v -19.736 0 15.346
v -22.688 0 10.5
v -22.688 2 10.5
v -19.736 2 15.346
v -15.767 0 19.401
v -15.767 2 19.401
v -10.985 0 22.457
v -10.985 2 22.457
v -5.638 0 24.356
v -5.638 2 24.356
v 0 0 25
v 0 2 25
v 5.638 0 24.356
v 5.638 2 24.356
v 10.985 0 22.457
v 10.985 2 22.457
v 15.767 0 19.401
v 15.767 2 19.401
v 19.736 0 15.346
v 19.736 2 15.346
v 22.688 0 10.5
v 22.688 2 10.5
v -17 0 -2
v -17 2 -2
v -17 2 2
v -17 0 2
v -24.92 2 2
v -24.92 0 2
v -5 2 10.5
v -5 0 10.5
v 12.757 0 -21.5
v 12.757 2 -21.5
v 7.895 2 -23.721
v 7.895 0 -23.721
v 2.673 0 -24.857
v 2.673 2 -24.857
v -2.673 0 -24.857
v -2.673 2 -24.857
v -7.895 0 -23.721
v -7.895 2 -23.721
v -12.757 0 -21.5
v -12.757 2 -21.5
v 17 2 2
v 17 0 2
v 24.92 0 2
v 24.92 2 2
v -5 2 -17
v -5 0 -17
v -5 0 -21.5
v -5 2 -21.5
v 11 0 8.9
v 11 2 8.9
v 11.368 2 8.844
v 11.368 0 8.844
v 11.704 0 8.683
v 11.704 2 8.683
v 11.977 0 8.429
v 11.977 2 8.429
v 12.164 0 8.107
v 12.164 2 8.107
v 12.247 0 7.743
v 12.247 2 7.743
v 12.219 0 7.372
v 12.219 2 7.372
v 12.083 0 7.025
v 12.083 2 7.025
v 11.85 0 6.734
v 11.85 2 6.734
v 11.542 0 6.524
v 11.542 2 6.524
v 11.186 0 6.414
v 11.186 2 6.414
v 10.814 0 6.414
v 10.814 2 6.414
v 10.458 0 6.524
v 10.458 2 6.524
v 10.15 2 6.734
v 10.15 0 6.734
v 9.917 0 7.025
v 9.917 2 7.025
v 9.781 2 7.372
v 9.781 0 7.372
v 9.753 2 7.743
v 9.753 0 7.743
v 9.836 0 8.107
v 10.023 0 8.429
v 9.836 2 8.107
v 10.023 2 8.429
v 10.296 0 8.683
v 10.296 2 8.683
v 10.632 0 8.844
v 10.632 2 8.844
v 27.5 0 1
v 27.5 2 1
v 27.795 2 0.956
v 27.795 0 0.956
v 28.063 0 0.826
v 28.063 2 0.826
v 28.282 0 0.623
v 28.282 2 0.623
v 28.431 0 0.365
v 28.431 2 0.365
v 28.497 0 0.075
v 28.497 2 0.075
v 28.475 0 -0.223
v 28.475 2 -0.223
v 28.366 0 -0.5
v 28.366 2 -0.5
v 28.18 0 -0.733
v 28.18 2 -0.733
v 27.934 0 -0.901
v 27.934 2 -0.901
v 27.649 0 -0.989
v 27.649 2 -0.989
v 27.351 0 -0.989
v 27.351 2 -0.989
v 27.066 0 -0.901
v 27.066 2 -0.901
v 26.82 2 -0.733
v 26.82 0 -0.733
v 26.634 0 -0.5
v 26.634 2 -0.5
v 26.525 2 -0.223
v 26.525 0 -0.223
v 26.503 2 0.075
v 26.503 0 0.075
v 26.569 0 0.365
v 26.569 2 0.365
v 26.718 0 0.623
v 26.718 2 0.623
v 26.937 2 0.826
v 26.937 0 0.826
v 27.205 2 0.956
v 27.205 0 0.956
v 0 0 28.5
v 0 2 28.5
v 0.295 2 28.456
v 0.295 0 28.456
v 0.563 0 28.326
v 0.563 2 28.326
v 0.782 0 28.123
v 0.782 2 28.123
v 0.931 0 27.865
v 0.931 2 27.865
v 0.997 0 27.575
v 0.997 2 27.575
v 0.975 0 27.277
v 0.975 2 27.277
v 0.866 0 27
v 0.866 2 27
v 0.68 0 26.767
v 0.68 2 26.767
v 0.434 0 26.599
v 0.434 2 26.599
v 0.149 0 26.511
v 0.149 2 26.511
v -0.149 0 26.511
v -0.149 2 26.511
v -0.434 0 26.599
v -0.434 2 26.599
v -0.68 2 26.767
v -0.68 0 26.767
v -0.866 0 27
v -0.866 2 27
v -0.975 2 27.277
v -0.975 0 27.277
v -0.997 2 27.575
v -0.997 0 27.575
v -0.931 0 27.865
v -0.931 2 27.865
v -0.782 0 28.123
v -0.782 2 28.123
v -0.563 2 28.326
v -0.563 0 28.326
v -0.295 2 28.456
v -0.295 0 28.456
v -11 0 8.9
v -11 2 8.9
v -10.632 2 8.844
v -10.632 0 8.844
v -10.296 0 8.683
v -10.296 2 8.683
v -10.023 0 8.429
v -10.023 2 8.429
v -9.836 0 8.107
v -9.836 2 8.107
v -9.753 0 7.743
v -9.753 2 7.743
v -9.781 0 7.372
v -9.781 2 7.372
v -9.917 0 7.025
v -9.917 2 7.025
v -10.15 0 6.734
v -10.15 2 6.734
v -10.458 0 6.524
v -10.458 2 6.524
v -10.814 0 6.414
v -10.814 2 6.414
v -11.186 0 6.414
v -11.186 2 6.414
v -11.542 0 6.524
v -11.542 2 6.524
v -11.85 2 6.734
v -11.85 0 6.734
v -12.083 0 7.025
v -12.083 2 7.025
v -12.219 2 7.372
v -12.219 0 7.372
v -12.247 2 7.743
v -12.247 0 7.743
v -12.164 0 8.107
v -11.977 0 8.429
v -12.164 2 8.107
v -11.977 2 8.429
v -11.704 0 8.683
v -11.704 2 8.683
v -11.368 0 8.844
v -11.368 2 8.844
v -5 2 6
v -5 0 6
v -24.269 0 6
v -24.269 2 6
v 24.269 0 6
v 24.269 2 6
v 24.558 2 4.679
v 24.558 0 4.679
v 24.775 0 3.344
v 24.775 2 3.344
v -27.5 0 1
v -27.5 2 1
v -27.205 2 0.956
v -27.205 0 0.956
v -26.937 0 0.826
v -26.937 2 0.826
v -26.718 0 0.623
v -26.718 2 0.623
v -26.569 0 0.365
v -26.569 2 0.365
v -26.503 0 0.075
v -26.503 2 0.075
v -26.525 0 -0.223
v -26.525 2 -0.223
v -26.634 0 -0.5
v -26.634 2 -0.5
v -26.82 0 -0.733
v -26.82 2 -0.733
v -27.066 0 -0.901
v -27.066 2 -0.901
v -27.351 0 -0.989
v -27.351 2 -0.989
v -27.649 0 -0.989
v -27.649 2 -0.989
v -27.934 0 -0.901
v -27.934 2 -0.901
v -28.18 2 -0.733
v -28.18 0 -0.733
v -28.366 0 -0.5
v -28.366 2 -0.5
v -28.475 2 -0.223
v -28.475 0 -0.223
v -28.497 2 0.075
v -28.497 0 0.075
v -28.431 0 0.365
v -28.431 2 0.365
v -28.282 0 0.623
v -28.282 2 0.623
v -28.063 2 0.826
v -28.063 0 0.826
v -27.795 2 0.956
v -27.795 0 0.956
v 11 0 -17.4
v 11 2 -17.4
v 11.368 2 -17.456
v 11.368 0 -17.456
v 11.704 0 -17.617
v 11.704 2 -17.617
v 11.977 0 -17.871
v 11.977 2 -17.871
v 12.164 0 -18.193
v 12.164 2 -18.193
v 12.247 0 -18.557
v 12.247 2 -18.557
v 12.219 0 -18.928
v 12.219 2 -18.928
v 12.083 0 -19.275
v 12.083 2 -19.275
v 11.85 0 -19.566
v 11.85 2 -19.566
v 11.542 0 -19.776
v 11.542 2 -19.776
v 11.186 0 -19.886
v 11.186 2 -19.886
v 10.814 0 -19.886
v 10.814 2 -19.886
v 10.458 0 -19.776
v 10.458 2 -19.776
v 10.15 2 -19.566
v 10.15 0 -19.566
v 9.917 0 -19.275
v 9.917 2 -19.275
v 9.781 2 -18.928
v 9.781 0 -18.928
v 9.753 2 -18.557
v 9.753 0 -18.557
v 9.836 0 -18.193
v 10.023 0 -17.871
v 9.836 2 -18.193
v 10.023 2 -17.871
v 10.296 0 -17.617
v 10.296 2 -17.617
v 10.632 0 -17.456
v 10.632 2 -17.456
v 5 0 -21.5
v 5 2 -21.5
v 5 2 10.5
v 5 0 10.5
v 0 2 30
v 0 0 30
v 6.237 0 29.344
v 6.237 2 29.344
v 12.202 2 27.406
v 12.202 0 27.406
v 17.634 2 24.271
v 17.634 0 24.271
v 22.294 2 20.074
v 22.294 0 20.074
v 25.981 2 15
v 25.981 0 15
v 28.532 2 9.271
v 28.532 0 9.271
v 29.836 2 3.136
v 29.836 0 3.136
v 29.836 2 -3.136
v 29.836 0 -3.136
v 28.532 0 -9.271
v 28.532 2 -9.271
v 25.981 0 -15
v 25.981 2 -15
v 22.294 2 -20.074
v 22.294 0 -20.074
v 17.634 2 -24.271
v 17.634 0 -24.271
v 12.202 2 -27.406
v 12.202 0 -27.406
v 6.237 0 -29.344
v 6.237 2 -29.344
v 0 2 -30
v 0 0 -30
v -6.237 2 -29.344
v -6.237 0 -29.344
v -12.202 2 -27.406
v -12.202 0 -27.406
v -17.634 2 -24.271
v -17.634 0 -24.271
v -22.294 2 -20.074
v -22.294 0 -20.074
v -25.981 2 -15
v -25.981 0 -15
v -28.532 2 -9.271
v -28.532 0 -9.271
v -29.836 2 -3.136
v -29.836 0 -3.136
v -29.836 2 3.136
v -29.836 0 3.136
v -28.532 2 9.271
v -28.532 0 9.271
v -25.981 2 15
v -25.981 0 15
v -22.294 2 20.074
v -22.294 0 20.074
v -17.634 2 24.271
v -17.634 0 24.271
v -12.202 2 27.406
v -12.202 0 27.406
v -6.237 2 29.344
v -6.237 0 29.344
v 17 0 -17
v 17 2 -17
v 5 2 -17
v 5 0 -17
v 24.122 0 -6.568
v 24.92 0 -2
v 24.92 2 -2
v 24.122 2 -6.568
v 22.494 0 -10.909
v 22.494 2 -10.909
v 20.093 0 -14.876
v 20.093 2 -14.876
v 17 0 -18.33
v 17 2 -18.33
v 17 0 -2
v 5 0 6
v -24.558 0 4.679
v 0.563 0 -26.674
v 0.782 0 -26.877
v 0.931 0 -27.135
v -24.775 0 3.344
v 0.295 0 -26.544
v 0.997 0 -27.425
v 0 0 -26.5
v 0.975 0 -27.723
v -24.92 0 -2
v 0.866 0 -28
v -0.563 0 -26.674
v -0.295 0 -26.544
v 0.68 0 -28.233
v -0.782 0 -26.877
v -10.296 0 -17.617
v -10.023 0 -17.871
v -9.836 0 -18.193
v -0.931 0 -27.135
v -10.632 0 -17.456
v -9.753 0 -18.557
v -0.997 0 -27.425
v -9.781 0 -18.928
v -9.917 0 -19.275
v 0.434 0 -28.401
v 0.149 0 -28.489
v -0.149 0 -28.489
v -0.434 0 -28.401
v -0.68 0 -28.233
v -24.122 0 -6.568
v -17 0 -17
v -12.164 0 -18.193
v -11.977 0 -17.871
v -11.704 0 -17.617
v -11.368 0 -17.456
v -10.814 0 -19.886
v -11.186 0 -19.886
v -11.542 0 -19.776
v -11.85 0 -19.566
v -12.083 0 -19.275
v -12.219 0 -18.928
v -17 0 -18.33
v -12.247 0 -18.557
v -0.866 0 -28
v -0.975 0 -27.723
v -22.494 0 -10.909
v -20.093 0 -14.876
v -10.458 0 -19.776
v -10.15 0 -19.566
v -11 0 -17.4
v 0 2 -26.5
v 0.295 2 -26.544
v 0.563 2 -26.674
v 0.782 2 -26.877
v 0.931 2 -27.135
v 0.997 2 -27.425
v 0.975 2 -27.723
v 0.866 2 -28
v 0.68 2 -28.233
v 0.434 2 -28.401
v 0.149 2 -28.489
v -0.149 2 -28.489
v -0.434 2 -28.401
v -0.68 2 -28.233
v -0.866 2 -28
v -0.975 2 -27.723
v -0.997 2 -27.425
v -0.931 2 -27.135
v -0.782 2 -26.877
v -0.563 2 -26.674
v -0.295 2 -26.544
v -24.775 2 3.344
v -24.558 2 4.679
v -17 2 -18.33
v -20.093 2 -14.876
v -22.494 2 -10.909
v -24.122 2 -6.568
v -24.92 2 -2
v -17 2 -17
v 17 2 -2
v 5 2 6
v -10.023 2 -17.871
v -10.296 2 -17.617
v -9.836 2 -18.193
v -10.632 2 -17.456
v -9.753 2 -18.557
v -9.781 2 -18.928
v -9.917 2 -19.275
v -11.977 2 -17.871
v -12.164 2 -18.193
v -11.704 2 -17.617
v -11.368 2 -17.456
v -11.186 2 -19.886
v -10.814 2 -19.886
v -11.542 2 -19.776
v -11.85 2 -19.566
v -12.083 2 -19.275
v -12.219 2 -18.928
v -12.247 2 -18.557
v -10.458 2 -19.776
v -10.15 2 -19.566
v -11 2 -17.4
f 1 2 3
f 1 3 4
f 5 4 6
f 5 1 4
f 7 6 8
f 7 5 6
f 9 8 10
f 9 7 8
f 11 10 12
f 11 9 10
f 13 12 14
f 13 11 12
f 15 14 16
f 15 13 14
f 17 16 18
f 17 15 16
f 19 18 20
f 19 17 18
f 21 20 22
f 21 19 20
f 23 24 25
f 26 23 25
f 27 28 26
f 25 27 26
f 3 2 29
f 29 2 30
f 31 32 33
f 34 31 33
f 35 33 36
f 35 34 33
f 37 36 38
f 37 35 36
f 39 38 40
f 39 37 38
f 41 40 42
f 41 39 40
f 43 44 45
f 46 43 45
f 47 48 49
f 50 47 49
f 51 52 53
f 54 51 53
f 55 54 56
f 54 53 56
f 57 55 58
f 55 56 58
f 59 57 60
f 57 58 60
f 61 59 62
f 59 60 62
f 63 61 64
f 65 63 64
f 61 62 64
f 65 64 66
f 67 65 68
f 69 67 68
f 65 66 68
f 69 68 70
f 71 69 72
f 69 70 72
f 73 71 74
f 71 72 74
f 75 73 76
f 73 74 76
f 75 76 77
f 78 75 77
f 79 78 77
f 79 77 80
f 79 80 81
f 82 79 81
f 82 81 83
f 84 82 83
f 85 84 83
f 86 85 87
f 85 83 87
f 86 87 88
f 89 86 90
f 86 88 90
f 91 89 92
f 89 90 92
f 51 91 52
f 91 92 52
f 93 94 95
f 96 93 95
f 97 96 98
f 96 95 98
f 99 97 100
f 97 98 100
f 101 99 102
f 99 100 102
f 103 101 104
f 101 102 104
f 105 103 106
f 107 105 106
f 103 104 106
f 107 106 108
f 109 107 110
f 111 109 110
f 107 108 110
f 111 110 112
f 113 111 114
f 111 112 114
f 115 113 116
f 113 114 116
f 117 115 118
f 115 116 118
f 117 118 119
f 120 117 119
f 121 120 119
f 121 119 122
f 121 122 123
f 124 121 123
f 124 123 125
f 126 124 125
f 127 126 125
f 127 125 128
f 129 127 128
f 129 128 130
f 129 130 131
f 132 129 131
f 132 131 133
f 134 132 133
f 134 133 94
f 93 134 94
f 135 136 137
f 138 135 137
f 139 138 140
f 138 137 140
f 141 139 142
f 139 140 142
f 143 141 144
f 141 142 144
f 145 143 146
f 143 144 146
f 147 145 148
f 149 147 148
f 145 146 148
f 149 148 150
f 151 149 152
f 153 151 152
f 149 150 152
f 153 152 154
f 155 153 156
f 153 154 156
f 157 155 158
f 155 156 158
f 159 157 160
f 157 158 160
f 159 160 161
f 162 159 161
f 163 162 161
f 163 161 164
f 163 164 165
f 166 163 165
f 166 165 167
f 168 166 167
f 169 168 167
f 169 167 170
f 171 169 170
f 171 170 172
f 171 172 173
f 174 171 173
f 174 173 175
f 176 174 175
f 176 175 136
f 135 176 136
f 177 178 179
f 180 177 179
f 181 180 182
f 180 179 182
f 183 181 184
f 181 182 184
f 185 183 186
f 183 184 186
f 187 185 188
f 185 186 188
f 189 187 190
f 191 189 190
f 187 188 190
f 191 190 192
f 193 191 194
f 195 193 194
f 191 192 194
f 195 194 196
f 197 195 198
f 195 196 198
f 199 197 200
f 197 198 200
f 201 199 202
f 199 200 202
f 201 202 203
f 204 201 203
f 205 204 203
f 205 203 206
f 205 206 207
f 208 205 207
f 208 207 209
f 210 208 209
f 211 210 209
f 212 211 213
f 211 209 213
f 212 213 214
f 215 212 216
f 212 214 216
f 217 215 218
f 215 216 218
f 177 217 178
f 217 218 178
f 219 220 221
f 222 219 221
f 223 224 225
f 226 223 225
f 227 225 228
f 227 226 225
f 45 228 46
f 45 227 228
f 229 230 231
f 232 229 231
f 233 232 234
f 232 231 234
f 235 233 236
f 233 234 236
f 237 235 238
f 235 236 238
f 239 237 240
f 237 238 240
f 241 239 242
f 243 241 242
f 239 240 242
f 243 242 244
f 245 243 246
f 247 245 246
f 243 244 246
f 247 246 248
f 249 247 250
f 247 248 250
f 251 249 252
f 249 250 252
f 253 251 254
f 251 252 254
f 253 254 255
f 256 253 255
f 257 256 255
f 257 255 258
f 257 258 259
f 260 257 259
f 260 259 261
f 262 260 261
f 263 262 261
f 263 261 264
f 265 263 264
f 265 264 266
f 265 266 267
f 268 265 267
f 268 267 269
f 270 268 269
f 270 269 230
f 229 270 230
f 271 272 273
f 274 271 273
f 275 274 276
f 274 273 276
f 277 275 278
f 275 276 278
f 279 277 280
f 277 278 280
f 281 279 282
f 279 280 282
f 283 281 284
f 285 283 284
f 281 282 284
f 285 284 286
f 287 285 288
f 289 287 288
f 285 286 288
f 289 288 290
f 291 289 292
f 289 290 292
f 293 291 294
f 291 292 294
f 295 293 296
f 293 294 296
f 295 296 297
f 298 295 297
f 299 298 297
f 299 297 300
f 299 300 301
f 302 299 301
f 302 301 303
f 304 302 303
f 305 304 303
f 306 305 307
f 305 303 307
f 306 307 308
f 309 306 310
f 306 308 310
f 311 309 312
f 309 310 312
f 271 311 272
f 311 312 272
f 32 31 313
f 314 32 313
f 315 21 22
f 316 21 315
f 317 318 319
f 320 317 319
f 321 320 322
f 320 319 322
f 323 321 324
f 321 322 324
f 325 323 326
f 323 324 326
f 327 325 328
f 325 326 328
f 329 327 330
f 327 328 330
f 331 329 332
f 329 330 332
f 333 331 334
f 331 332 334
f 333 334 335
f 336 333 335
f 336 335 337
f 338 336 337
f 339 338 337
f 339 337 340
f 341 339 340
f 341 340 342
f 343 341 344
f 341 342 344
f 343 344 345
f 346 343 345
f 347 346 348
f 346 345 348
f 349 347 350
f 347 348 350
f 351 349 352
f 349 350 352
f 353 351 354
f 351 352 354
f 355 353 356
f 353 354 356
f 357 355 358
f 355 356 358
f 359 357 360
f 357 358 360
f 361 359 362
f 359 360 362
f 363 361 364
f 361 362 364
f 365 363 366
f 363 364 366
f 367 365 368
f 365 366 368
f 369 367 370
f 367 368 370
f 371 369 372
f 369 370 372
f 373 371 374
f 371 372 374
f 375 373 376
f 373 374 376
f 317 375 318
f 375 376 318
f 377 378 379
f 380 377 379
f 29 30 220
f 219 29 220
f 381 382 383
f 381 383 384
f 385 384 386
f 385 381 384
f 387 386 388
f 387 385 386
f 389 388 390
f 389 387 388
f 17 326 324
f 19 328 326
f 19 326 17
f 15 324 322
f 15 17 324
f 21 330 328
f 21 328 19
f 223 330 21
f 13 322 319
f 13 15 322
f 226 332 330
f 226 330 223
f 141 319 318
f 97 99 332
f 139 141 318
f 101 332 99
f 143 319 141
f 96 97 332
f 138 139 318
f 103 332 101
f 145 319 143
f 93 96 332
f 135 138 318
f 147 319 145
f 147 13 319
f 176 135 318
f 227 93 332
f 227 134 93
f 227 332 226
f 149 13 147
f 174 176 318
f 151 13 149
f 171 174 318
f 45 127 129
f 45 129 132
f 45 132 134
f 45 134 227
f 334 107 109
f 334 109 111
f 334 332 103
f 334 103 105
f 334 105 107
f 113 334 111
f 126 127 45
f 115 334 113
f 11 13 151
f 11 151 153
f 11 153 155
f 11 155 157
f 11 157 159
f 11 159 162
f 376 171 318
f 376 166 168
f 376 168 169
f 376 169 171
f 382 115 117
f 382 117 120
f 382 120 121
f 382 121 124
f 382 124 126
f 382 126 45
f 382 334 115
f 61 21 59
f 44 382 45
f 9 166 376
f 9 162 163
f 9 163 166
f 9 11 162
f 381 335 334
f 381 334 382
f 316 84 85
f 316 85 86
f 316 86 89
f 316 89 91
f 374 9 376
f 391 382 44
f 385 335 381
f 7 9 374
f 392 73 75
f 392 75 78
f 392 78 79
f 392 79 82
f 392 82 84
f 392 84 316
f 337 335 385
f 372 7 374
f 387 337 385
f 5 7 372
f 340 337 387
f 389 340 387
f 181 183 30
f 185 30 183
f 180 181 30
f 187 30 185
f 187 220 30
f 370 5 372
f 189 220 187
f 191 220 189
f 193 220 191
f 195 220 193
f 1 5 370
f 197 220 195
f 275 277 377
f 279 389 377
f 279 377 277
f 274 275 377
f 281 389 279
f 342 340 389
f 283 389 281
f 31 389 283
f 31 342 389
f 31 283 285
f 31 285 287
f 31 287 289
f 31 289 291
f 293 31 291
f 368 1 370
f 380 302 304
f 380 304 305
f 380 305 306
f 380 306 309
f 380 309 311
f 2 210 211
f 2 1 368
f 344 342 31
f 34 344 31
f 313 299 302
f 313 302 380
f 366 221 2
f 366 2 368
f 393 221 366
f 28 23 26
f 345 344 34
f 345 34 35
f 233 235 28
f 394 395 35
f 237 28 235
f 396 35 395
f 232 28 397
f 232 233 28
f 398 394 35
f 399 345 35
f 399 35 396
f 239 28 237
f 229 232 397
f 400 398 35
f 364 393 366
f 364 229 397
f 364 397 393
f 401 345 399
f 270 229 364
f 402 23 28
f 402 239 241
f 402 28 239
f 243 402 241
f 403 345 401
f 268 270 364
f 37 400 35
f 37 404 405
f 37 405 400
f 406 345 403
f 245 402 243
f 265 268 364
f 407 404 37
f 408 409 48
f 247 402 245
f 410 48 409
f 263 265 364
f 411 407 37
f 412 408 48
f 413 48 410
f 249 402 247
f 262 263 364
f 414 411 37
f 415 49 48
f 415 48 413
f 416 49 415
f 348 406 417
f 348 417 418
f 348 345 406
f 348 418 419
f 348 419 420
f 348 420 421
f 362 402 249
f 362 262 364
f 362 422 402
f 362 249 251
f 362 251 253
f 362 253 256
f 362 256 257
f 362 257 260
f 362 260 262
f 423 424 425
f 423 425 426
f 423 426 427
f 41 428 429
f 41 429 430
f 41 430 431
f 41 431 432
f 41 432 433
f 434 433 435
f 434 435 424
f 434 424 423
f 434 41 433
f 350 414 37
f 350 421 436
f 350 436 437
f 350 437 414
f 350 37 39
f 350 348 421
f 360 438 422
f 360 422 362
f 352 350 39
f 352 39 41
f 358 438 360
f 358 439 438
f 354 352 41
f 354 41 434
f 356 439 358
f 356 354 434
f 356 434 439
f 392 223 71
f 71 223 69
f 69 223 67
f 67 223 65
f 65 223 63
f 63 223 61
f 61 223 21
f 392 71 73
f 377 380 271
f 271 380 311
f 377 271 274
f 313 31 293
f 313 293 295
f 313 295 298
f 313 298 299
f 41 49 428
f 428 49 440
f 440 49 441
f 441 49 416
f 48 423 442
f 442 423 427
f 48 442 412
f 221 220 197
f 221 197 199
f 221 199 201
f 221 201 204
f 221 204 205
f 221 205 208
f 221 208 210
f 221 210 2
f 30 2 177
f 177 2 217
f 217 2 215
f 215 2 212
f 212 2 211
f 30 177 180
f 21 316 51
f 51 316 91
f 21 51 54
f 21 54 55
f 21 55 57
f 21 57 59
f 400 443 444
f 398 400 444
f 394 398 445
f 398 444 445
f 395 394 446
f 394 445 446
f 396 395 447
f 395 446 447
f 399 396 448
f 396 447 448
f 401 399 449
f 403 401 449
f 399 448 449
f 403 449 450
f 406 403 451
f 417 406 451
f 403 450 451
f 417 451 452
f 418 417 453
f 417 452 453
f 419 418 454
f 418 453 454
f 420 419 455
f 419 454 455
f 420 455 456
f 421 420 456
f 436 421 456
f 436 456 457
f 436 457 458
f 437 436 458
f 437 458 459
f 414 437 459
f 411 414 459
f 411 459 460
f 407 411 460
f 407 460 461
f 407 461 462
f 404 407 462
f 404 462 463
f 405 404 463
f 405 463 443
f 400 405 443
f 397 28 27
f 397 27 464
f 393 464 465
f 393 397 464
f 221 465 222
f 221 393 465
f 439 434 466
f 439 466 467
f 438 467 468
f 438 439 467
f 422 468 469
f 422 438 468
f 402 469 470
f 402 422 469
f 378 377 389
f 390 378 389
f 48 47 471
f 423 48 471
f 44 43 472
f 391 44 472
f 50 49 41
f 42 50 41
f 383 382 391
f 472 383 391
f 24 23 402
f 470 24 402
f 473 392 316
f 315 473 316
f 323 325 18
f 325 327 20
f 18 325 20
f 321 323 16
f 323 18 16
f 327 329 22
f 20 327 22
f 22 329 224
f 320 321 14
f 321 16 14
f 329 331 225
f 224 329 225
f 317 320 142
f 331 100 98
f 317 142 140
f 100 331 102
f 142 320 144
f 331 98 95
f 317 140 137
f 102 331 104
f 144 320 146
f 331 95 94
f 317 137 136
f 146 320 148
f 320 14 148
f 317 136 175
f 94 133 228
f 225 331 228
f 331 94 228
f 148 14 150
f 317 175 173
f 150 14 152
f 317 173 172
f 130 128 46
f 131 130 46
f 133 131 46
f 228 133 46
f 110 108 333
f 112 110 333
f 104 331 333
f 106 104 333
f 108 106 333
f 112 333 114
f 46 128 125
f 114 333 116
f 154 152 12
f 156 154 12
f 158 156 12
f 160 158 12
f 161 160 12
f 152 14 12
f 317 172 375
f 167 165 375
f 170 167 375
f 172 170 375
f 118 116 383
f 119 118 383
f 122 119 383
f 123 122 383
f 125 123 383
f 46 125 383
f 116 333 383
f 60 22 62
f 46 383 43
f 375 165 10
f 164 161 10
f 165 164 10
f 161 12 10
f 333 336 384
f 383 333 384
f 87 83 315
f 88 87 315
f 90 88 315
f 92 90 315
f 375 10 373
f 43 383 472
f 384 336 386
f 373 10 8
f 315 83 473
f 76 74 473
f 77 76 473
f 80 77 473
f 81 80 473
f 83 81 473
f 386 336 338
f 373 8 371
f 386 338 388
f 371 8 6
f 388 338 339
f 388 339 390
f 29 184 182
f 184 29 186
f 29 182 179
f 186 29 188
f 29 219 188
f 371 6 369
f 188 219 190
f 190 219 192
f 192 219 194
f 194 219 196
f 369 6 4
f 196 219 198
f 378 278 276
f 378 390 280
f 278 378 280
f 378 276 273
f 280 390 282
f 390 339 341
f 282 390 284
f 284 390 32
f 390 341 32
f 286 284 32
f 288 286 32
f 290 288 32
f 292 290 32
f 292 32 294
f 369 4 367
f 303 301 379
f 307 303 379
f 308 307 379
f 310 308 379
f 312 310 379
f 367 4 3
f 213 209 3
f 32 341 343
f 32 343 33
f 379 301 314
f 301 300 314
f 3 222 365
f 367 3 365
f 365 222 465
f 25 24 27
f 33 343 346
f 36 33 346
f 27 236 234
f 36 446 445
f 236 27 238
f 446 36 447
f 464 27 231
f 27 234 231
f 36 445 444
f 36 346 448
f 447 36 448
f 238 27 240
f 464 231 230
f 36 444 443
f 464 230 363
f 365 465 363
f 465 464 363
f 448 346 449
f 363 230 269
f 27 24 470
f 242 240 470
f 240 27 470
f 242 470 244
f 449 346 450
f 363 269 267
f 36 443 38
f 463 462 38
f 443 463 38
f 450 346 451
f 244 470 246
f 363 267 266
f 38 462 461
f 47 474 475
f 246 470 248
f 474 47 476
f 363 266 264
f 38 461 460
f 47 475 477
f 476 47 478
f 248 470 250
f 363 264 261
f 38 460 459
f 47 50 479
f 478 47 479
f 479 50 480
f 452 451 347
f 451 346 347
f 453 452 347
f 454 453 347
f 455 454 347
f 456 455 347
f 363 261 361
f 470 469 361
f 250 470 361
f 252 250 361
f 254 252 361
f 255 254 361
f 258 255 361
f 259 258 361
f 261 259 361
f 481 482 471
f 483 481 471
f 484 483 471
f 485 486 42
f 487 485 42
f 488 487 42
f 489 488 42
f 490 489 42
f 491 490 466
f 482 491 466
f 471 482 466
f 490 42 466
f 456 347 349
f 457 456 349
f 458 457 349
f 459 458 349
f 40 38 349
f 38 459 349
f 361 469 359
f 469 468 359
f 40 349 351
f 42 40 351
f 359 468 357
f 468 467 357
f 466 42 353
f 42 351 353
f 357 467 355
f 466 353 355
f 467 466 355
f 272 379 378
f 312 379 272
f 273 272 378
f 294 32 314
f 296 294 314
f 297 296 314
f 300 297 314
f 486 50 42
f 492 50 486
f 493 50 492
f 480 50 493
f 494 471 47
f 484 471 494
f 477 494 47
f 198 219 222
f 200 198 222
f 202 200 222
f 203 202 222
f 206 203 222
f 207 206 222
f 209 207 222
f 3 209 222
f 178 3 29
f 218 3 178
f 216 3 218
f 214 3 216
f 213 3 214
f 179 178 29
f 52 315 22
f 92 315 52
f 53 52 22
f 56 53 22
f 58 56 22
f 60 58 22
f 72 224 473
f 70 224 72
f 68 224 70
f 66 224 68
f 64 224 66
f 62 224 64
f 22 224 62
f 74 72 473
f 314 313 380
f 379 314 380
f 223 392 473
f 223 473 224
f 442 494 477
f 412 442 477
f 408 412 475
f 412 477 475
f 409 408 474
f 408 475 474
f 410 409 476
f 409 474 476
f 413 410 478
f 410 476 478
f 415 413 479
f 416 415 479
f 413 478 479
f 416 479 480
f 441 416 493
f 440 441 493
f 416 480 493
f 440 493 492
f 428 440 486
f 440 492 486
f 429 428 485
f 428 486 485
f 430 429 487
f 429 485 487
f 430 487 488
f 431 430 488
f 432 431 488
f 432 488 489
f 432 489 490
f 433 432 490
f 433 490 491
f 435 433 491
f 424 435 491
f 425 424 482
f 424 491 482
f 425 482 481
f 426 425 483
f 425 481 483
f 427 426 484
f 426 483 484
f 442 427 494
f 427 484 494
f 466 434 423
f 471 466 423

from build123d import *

# Parameters (mm, degrees)
SKETCH1_R           = 30
SKETCH1_R_2         = 25
BOSS_EXTRUDE1_DEPTH = 2
SKETCH2_R           = 1
CUT_EXTRUDE1_DEPTH  = 43.473521163
BOSS_EXTRUDE2_DEPTH = 2
BOSS_EXTRUDE3_DEPTH = 2
CUT_EXTRUDE2_DEPTH  = 2
BOSS_EXTRUDE4_DEPTH = 2
SKETCH16_R          = 1.25
CUT_EXTRUDE3_DEPTH  = 2


with BuildPart() as part:
    # Sketch1 → Boss-Extrude1 (new body)
    with BuildSketch(Plane(origin=(0, 0, 0), x_dir=(1, 0, 0), z_dir=(0, 1, 0))):
        with Locations(Location((0, 0, 0), (0, 0, 270))):
            Circle(SKETCH1_R)
        with Locations(Location((0, 0, 0), (0, 0, 270))):
            Circle(SKETCH1_R_2, mode=Mode.SUBTRACT)
    extrude(amount=BOSS_EXTRUDE1_DEPTH)

    # Sketch2 → Cut-Extrude1 (cut, through all)
    with BuildSketch(Plane(origin=(0, 2, 0), x_dir=(1, 0, 0), z_dir=(0, 1, 0))):
        with Locations(Location((0, 27.5, 0), (0, 0, 270))):
            Circle(SKETCH2_R)
        with Locations(Location((27.5, 0, 0), (0, 0, 270))):
            Circle(SKETCH2_R)
        with Locations(Location((0, -27.5, 0), (0, 0, 270))):
            Circle(SKETCH2_R)
        with Locations(Location((-27.5, 0, 0), (0, 0, 270))):
            Circle(SKETCH2_R)
    extrude(amount=-CUT_EXTRUDE1_DEPTH, mode=Mode.SUBTRACT)

    # Sketch3 → Boss-Extrude2 (add)
    with BuildSketch(Plane(origin=(0, 0, 0), x_dir=(1, 0, 0), z_dir=(0, 1, 0))):
        with BuildLine():
            Line((-24.919871589, -2), (0, -2))
            Line((0, -2), (24.919871589, -2))
            ThreePointArc((24.919871589, -2), (25, 0), (24.919871589, 2))
            Line((24.919871589, 2), (-24.919871589, 2))
            ThreePointArc((-24.919871589, 2), (-25, 0), (-24.919871589, -2))
        make_face()
    extrude(amount=BOSS_EXTRUDE2_DEPTH)

    # Sketch13 → Boss-Extrude3 (add)
    with BuildSketch(Plane(origin=(0, 0, 0), x_dir=(1, 0, 0), z_dir=(0, 1, 0))):
        with BuildLine():
            Line((17, 0), (17, 18.33030278))
            ThreePointArc((17, 18.33030278), (14.962844887, 20.027812484), (12.757350822, 21.5))
            Line((12.757350822, 21.5), (5, 21.5))
            Line((5, 21.5), (5, -10.5))
            Line((5, -10.5), (17, -10.5))
            Line((17, -10.5), (17, 0))
        make_face()
        with BuildLine():
            Line((-5, 0), (-5, 21.5))
            Line((-5, 21.5), (-12.757350822, 21.5))
            ThreePointArc((-12.757350822, 21.5), (-14.962844887, 20.027812484), (-17, 18.33030278))
            Line((-17, 18.33030278), (-17, -10.5))
            Line((-17, -10.5), (-5, -10.5))
            Line((-5, -10.5), (-5, 0))
        make_face()
    extrude(amount=BOSS_EXTRUDE3_DEPTH)

    # Sketch14 → Cut-Extrude2 (cut)
    with BuildSketch(Plane(origin=(0, 2, 0), x_dir=(1, 0, 0), z_dir=(0, 1, 0))):
        Polygon((17, 0), (5, 0), (5, -2), (5, -6), (17, -6), (17, -2), align=None)
        Polygon((5, 2), (5, 0), (17, 0), (17, 2), (17, 17), (5, 17), align=None)
        Polygon((5, 0), (0, 0), (-5, 0), (-5, -2), (5, -2), align=None)
        Polygon((-5, 0), (0, 0), (5, 0), (5, 2), (-5, 2), align=None)
        Polygon((-17, 0), (-5, 0), (-5, 2), (-5, 17), (-17, 17), (-17, 2), align=None)
        Polygon((-5, -2), (-5, 0), (-17, 0), (-17, -2), (-17, -6), (-5, -6), align=None)
    extrude(amount=-CUT_EXTRUDE2_DEPTH, mode=Mode.SUBTRACT)


with BuildPart() as cut_extrude2_piece_1:
    # of the separate pieces the step leaves, piece 1, a body of its own (cut_extrude2_pieces)
    add(part.part.solids().sort_by_distance((0, 0, 30))[0])



with BuildPart() as cut_extrude2_piece_2:
    # of the separate pieces the step leaves, piece 2, a body of its own (cut_extrude2_pieces)
    add(part.part.solids().sort_by_distance((-17, 0, 6))[0])


with BuildPart() as cut_extrude2_piece_3:
    # of the separate pieces the step leaves, piece 3, a body of its own (cut_extrude2_pieces)
    add(part.part.solids().sort_by_distance((17, 0, 10.5))[0])


with BuildPart() as cut_extrude2_piece_1_1:
    add(cut_extrude2_piece_1.part)

    add(cut_extrude2_piece_2.part)  # Boss-Extrude4 merges Cut-Extrude2 piece 2

    add(cut_extrude2_piece_3.part)  # Boss-Extrude4 merges Cut-Extrude2 piece 3
    # Sketch15 → Boss-Extrude4 (add)
    with BuildSketch(Plane(origin=(0, 0, 0), x_dir=(1, 0, 0), z_dir=(0, 1, 0))):
        with BuildLine():
            Line((17, -6), (24.269322199, -6))
            ThreePointArc((24.269322199, -6), (23.586276437, -8.287796079), (22.688102609, -10.5))
            Line((22.688102609, -10.5), (17, -10.5))
            Line((17, -10.5), (17, -6))
        make_face()
        with BuildLine():
            Line((-17, -6), (-24.269322199, -6))
            ThreePointArc((-24.269322199, -6), (-23.586276437, -8.287796079), (-22.688102609, -10.5))
            Line((-22.688102609, -10.5), (-17, -10.5))
            Line((-17, -10.5), (-17, -6))
        make_face()
    extrude(amount=BOSS_EXTRUDE4_DEPTH)

    # Sketch16 → Cut-Extrude3 (cut)
    with BuildSketch(Plane(origin=(0, 2, 0), x_dir=(1, 0, 0), z_dir=(0, 1, 0))):
        with Locations(Location((11, 18.65, 0), (0, 0, 270))):
            Circle(SKETCH16_R)
        with Locations(Location((11, -7.65, 0), (0, 0, 270))):
            Circle(SKETCH16_R)
        with Locations(Location((-11, -7.65, 0), (0, 0, 270))):
            Circle(SKETCH16_R)
        with Locations(Location((-11, 18.65, 0), (0, 0, 270))):
            Circle(SKETCH16_R)
    extrude(amount=-CUT_EXTRUDE3_DEPTH, mode=Mode.SUBTRACT)


solid = cut_extrude2_piece_1_1.part
